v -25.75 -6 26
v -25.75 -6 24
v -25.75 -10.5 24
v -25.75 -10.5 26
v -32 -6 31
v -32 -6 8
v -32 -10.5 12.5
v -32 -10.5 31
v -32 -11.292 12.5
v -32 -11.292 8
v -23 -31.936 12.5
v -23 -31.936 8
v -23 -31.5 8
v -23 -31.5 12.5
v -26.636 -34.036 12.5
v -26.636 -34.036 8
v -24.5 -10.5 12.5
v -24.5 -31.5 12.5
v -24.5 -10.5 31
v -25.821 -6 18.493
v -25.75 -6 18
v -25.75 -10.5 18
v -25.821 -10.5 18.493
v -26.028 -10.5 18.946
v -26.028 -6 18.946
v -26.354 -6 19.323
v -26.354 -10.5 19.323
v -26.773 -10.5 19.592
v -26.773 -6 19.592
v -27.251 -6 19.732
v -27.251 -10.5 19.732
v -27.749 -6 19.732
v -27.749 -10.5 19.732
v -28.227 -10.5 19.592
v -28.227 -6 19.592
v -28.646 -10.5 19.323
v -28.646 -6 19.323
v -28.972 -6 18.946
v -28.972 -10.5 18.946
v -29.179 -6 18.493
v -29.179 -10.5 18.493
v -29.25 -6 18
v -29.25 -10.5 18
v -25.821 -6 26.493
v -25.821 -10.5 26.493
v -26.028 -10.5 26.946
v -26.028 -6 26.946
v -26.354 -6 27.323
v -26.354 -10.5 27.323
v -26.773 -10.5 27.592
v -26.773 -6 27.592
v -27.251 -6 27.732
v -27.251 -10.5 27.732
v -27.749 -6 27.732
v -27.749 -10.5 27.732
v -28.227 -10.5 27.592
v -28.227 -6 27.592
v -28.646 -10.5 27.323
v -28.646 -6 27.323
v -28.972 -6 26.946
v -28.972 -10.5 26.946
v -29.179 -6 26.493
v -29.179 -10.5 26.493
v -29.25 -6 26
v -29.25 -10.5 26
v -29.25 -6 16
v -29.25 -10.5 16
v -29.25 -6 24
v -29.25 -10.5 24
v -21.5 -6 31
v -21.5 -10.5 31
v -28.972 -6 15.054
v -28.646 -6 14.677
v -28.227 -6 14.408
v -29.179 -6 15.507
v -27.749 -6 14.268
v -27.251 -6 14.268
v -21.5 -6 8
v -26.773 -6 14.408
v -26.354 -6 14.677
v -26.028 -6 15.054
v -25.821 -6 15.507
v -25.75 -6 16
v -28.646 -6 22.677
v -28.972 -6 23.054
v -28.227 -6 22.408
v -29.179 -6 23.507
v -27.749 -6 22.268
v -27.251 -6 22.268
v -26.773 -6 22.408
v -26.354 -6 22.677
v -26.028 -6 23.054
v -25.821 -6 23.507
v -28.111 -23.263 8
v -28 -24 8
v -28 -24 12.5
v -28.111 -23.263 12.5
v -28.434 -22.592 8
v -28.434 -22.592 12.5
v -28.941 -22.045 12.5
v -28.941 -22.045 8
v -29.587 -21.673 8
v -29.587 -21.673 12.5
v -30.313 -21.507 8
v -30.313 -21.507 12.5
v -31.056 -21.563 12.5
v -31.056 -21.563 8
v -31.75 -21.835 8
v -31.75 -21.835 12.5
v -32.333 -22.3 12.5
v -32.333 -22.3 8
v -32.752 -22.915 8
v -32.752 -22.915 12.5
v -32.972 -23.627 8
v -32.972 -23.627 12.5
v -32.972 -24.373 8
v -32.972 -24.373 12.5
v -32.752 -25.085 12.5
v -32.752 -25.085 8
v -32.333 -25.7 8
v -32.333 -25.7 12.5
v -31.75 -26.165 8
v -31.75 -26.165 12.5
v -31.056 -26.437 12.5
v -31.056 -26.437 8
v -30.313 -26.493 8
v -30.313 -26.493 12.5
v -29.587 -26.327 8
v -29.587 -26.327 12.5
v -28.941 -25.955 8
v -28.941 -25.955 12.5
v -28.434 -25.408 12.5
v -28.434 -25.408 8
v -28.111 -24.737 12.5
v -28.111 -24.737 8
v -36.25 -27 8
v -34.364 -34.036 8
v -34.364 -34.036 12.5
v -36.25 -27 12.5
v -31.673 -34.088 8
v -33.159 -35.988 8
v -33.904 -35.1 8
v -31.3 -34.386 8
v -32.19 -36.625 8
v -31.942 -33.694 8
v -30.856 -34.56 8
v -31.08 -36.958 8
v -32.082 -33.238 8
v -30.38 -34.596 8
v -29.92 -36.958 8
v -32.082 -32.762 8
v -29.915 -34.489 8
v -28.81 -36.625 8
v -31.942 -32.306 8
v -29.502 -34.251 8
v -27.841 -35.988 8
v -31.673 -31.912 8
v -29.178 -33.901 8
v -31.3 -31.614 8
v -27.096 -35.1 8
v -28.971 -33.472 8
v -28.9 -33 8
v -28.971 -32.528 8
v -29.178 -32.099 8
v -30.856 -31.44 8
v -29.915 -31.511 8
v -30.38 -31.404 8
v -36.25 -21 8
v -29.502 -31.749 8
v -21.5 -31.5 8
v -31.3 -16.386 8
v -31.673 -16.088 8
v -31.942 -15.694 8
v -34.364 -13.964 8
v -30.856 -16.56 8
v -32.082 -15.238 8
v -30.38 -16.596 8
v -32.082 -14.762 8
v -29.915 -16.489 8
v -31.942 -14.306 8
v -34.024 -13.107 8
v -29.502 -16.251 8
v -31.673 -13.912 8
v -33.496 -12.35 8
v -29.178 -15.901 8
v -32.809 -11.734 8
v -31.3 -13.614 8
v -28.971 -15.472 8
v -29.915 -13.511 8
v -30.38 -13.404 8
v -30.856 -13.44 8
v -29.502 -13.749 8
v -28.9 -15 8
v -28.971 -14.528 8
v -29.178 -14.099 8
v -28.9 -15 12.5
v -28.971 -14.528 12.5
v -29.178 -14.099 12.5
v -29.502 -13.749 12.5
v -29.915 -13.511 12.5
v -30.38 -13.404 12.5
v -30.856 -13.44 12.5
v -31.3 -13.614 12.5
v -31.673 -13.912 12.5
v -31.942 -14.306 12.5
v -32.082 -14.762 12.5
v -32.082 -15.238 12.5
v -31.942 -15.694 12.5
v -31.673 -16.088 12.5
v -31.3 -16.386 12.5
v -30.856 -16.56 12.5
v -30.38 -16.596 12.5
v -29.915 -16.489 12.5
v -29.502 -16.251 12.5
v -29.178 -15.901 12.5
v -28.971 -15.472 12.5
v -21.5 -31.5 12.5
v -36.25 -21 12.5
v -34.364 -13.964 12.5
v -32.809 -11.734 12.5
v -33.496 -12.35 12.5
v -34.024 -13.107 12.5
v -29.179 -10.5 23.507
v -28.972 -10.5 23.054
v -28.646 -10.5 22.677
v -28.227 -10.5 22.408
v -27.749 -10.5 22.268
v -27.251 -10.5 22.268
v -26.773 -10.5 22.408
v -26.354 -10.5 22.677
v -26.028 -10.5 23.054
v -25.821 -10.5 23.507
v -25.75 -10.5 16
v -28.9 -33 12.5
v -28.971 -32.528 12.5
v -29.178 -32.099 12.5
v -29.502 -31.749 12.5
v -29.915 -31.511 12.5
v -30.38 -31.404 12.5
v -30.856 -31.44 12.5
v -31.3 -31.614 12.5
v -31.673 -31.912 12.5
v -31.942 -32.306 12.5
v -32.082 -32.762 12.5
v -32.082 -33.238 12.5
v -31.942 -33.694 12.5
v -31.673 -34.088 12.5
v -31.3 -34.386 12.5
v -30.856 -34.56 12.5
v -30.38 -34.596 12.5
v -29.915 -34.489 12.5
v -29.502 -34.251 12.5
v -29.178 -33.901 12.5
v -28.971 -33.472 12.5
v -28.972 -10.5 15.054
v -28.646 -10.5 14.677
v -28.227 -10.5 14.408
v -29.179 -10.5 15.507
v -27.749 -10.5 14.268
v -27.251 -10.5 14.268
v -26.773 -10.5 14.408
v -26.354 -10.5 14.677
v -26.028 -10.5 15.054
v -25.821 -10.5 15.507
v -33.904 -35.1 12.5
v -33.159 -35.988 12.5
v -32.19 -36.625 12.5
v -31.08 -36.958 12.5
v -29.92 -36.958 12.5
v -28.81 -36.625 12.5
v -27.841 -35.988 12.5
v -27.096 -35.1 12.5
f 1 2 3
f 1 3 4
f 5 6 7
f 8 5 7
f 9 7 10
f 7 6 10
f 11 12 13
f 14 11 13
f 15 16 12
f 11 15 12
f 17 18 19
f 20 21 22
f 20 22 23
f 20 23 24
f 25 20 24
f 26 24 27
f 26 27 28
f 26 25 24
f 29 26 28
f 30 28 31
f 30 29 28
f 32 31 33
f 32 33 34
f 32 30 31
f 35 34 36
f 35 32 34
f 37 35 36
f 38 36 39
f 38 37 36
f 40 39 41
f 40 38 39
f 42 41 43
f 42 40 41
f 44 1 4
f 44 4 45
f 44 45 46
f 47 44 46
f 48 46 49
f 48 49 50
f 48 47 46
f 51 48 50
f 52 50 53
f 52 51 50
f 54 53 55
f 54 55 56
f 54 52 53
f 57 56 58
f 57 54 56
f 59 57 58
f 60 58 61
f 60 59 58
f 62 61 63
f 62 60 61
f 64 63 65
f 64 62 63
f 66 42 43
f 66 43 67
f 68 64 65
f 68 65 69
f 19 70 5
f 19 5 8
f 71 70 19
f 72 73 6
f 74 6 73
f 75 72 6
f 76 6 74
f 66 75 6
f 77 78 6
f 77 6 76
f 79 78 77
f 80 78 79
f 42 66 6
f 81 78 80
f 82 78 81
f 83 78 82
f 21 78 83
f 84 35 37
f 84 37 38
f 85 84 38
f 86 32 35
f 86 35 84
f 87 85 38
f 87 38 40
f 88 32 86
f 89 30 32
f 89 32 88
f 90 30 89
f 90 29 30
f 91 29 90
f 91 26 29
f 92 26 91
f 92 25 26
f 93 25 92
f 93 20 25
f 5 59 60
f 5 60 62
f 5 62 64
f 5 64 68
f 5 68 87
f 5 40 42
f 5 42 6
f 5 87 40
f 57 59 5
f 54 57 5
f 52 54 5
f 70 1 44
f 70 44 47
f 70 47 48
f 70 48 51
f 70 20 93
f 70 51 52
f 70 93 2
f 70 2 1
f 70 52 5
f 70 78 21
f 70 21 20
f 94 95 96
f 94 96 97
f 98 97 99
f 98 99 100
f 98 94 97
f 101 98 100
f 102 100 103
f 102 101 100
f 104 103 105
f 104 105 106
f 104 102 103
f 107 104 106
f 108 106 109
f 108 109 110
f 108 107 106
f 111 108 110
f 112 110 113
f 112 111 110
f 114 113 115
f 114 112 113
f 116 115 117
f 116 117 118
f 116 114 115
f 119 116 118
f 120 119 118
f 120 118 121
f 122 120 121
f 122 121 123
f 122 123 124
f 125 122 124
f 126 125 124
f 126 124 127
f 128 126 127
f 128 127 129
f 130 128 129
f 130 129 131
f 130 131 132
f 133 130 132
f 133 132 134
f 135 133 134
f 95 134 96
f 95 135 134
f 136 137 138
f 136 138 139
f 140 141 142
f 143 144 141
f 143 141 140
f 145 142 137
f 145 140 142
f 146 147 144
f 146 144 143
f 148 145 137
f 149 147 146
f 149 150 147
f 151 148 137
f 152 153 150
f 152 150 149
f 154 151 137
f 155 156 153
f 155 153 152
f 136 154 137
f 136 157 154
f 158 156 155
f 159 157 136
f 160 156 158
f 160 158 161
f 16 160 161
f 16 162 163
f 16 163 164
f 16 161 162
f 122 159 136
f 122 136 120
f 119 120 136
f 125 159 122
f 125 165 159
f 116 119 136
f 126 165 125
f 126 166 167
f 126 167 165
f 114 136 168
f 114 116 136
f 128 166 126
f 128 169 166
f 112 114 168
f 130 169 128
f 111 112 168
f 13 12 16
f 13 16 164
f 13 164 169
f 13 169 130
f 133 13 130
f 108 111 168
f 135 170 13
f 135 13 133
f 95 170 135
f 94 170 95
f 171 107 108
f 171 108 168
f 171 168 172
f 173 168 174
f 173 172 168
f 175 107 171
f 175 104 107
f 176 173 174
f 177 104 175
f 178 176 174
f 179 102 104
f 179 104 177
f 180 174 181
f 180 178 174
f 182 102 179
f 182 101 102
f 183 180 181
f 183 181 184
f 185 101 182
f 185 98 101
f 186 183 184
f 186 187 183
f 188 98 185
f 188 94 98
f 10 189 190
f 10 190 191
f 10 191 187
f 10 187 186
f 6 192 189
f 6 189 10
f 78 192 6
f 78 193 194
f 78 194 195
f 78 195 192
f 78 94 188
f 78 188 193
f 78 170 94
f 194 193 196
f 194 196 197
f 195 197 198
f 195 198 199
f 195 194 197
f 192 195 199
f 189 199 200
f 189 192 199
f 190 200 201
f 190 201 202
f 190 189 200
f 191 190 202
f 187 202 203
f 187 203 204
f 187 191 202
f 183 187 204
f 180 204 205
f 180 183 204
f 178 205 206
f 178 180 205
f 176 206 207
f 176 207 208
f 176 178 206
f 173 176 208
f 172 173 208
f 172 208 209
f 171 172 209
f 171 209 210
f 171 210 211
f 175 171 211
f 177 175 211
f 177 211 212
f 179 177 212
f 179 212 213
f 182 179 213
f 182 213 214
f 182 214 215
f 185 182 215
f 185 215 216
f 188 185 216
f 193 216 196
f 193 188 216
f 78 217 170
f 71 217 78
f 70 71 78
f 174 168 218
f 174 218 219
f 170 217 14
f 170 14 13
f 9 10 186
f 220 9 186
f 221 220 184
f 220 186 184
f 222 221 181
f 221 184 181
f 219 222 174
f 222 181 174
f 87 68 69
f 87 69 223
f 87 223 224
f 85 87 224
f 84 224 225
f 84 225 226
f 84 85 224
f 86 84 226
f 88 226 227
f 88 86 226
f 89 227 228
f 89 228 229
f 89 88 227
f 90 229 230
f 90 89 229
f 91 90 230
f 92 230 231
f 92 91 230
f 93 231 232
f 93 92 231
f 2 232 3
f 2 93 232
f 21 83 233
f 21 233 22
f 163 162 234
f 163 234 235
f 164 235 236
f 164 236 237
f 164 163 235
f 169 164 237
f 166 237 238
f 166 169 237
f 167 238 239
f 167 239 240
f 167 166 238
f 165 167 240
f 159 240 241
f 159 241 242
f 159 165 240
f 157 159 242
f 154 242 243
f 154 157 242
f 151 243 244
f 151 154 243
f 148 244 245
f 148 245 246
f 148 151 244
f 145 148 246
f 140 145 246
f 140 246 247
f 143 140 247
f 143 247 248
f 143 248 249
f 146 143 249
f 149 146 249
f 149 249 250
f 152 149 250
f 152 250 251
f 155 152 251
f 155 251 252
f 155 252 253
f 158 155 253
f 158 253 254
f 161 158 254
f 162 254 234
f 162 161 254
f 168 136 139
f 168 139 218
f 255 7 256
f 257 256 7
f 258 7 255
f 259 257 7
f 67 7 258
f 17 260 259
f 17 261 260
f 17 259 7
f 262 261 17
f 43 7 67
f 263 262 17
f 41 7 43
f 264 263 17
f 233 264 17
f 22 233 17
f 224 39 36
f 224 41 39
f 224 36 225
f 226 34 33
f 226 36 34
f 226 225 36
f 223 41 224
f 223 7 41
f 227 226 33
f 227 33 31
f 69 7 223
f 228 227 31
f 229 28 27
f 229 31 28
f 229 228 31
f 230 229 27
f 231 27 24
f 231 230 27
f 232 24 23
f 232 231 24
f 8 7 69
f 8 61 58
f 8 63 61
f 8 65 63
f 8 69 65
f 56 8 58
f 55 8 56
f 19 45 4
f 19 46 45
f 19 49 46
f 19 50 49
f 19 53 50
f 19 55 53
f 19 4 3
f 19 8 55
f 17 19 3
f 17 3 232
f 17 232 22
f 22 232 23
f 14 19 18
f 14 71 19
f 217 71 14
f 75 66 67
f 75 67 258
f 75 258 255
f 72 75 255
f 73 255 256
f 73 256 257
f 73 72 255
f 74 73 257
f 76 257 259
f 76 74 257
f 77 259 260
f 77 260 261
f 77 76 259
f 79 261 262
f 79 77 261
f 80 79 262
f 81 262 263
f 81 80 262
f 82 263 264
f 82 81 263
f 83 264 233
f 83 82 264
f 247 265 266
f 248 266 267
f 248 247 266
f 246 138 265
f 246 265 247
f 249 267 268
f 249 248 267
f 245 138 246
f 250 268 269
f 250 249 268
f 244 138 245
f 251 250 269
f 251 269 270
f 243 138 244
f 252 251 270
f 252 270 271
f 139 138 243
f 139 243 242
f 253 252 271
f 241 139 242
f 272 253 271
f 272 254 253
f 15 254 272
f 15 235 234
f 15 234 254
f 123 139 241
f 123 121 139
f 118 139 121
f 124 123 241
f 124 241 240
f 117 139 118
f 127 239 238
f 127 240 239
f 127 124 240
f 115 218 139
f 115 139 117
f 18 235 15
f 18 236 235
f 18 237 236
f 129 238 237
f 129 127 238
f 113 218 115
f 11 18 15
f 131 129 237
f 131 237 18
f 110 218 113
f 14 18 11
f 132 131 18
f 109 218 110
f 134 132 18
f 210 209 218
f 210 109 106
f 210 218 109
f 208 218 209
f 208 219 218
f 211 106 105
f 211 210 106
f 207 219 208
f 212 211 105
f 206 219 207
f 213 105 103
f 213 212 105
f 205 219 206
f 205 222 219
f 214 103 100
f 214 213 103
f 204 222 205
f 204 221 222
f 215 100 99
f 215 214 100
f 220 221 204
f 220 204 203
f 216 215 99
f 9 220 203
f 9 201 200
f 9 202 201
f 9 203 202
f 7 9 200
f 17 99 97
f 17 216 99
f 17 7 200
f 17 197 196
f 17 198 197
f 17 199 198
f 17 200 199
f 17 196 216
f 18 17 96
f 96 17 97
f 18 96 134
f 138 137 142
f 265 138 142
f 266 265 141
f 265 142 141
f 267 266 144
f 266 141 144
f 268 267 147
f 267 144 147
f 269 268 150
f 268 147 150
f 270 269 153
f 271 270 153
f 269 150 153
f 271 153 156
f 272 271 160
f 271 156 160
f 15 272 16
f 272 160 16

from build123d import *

# Parameters (mm, degrees)
SKETCH016_W   = 9
SKETCH016_H   = 23
PAD005_DEPTH  = 4.5
SKETCH018_R   = 1.6
SKETCH018_R_2 = 2.5
PAD006_DEPTH  = 4.5
PAD011_DEPTH  = 1.5


with BuildPart() as part:
    # Sketch016 → Pad005 (new body)
    with BuildSketch(Plane.XZ):
        with Locations((3, 11.5)):
            Rectangle(SKETCH016_W, SKETCH016_H)
        with BuildLine():
            ThreePointArc((4.75, 18), (3, 19.75), (1.25, 18))
            Line((1.25, 18), (1.25, 16))
            ThreePointArc((1.25, 16), (3, 14.25), (4.75, 16))
            Line((4.75, 16), (4.75, 18))
        make_face(mode=Mode.SUBTRACT)
        with BuildLine():
            ThreePointArc((4.75, 10), (3, 11.75), (1.25, 10))
            Line((1.25, 10), (1.25, 8))
            ThreePointArc((1.25, 8), (3, 6.25), (4.75, 8))
            Line((4.75, 8), (4.75, 10))
        make_face(mode=Mode.SUBTRACT)
    extrude(amount=PAD005_DEPTH)

    # Sketch018 → Pad006 (join)
    with BuildSketch(Plane.XY):
        with BuildLine():
            ThreePointArc((-3.8635384963, -28.0358910598), (0, -31), (3.8635384963, -28.0358910598))
            Line((3.8635384963, -28.0358910598), (7.5, -25.9363790317))
            Line((7.5, -25.9363790317), (7.5, -4.5))
            Line((7.5, -4.5), (7.5, 0))
            Line((-1.5, 0), (7.5, 0))
            Line((-1.5, 0), (-1.5, -4.5))
            Line((-1.5, -4.5), (-1.5, -5.2919007565))
            ThreePointArc((-1.5, -5.2919007565), (-2.9961743014, -6.3499170663), (-3.8635384963, -7.9641089402))
            Line((-5.75, -15), (-3.8635384963, -7.9641089402))
            Line((-5.75, -21), (-5.75, -15))
            Line((-3.8635384963, -28.0358910598), (-5.75, -21))
        make_face()
        with Locations((0, -27)):
            Circle(SKETCH018_R, mode=Mode.SUBTRACT)
        with Locations((0, -9)):
            Circle(SKETCH018_R, mode=Mode.SUBTRACT)
        with Locations((0, -18)):
            Circle(SKETCH018_R_2, mode=Mode.SUBTRACT)
    extrude(amount=PAD006_DEPTH)

    # Sketch034 (on DatumPlane) → Pad011 (join, symmetric)
    with BuildSketch(Plane.YZ.offset(7.5)):
        Polygon((-4.5, 23), (-25.5, 4.5), (-25.5, 0), (0, 0), (0, 23), align=None)
    extrude(amount=PAD011_DEPTH, both=True)


with BuildPart() as part_1:
    # Body002 placement: moved
    add(part.part.moved(Location((-30.5, -6, 8))))


solid = part_1.part
